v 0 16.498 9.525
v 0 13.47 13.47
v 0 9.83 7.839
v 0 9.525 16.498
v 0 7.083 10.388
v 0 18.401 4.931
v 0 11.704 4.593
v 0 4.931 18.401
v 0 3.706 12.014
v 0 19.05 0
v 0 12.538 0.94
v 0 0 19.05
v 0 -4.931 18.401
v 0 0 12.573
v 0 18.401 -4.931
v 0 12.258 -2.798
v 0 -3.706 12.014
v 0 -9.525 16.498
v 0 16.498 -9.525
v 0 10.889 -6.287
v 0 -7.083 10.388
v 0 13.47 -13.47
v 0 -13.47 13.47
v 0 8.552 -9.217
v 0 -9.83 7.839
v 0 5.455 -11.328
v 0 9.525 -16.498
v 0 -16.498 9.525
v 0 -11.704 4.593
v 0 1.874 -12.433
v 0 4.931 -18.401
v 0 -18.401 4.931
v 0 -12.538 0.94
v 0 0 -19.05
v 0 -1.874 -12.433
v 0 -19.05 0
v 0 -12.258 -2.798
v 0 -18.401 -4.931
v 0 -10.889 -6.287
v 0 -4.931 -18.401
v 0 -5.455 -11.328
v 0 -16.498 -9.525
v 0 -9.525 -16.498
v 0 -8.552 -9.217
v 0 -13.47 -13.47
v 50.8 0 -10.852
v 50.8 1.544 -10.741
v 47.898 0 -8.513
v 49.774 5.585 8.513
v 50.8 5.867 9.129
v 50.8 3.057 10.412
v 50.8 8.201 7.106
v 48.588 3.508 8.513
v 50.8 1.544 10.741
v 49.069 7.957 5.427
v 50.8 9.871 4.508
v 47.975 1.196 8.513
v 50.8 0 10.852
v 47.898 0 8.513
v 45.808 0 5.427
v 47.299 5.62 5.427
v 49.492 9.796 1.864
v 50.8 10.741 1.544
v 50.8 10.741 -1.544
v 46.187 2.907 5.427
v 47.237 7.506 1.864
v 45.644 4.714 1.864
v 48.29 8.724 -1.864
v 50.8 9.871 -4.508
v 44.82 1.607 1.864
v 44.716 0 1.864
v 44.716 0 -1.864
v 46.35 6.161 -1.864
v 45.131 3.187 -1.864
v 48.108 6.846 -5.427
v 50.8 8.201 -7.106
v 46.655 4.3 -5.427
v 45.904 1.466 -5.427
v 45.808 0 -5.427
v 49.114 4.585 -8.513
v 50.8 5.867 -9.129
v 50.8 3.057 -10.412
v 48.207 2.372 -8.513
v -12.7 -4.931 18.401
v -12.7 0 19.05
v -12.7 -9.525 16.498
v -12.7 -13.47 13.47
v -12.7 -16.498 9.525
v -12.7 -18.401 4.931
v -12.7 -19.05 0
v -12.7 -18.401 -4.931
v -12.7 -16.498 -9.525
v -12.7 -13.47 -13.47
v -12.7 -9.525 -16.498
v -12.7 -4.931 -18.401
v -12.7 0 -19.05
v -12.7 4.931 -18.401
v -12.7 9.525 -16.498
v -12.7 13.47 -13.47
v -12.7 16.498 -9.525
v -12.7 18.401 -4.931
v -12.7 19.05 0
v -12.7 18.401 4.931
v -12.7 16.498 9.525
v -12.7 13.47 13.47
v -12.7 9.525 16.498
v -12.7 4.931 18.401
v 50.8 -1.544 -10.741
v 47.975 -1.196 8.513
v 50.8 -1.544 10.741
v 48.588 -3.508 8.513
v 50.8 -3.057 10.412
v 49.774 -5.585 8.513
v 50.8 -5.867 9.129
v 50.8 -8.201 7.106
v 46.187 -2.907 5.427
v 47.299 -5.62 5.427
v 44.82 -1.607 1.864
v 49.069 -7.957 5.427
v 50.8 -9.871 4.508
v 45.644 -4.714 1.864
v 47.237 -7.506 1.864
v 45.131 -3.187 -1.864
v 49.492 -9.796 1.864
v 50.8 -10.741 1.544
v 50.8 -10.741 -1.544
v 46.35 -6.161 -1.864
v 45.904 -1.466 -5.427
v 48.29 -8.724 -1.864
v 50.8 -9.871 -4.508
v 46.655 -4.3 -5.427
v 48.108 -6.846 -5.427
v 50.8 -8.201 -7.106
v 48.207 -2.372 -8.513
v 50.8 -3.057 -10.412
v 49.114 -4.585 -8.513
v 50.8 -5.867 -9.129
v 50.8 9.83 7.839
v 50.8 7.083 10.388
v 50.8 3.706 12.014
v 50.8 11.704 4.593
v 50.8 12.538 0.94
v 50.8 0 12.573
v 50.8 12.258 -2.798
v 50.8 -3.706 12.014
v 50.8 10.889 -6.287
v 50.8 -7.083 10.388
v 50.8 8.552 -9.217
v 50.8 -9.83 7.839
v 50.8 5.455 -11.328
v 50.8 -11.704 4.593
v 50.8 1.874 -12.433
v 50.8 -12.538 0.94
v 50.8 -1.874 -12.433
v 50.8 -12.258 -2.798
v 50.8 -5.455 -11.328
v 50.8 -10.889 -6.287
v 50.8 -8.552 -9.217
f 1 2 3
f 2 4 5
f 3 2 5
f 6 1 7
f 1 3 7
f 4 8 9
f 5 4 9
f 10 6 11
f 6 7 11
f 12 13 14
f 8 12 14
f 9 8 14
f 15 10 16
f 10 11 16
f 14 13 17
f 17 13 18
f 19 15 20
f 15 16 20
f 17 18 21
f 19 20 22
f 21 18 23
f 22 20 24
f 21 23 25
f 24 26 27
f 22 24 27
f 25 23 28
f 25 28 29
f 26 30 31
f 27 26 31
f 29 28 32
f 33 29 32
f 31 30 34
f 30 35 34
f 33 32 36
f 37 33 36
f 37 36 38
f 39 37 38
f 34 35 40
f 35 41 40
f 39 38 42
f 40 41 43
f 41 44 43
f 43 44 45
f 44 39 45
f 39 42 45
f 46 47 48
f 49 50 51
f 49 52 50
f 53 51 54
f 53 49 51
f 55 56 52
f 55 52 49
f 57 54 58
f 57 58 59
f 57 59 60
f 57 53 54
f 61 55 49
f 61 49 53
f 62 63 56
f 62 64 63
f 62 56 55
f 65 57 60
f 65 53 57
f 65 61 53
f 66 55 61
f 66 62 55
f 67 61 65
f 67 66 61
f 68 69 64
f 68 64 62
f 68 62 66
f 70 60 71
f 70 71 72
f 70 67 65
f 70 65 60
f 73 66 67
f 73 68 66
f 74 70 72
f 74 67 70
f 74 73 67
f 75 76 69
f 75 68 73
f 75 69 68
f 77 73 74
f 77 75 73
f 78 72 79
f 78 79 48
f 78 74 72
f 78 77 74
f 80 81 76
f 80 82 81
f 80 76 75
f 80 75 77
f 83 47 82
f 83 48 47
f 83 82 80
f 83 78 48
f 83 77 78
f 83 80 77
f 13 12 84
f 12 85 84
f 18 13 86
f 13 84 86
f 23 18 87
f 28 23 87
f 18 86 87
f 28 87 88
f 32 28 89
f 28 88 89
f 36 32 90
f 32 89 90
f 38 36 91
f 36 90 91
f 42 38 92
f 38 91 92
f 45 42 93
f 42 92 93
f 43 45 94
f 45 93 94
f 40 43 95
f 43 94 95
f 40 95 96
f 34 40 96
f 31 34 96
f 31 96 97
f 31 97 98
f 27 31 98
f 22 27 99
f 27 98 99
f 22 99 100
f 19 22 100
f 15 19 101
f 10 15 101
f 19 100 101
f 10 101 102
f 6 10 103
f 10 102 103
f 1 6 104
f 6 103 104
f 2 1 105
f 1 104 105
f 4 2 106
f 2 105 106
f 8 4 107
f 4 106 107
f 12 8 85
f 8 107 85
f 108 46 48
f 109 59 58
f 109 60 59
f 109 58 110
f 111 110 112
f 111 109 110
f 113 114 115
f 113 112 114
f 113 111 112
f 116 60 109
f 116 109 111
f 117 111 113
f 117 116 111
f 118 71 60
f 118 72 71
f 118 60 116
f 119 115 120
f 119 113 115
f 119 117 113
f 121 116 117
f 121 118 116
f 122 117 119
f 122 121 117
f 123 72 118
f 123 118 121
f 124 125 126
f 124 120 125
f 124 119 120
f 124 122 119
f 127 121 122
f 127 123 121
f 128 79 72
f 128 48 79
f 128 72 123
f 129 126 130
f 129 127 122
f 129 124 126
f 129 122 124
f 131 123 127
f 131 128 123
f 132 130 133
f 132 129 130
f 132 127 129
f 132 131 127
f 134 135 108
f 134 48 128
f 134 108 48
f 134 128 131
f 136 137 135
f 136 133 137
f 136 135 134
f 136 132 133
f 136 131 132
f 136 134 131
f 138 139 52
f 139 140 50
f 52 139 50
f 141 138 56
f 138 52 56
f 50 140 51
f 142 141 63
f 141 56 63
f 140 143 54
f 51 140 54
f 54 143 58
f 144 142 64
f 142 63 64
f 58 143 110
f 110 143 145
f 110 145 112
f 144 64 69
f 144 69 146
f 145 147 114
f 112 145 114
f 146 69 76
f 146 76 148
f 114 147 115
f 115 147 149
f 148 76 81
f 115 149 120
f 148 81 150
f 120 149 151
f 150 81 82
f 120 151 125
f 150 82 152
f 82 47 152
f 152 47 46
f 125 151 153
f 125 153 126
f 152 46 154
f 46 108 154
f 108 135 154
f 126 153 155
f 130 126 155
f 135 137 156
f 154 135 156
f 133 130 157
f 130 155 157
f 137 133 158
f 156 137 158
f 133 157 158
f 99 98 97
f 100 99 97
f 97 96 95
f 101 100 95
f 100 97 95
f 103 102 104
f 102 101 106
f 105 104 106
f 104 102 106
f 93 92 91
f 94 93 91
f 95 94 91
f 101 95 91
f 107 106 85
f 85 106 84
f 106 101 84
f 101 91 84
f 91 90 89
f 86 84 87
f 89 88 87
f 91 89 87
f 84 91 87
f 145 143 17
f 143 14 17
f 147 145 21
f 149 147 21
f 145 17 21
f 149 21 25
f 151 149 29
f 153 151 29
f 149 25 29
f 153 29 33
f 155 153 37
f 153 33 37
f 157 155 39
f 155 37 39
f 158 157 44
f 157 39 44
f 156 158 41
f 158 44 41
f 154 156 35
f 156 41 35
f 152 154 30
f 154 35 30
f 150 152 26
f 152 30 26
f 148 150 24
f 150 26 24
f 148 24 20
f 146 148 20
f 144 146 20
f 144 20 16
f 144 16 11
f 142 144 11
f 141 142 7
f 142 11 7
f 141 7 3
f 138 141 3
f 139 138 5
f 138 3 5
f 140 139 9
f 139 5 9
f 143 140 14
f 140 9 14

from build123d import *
from build123d import SkipClean  # not in build123d's __all__


with BuildPart() as f1:
    # F0 (on Front) → F1 (revolve)
    with BuildSketch(Plane.XZ):
        Polygon((0, 19.05), (-12.7, 19.05), (-12.7, 0), (0, 0), (50.8, 0), (50.8, 12.573), (0, 12.573), align=None)
    revolve(axis=Axis((25.4, 0, 0), (1, 0, 0)))

    # F2 (on Front) → F3 (revolve, cut)
    with BuildSketch(Plane.XZ):
        with BuildLine():
            Line((57.15, 0), (57.15, 12.573))
            ThreePointArc((57.15, 12.573), (44.577, 0), (57.15, -12.573))
            Line((57.15, -12.573), (57.15, 0))
        make_face()
    with SkipClean():  # cleaning this boolean's faces spoils the solid; the shape is the same uncleaned
        revolve(axis=Axis((57.15, 0, 0), (0, 0, 1)), mode=Mode.SUBTRACT)


solid = f1.part
